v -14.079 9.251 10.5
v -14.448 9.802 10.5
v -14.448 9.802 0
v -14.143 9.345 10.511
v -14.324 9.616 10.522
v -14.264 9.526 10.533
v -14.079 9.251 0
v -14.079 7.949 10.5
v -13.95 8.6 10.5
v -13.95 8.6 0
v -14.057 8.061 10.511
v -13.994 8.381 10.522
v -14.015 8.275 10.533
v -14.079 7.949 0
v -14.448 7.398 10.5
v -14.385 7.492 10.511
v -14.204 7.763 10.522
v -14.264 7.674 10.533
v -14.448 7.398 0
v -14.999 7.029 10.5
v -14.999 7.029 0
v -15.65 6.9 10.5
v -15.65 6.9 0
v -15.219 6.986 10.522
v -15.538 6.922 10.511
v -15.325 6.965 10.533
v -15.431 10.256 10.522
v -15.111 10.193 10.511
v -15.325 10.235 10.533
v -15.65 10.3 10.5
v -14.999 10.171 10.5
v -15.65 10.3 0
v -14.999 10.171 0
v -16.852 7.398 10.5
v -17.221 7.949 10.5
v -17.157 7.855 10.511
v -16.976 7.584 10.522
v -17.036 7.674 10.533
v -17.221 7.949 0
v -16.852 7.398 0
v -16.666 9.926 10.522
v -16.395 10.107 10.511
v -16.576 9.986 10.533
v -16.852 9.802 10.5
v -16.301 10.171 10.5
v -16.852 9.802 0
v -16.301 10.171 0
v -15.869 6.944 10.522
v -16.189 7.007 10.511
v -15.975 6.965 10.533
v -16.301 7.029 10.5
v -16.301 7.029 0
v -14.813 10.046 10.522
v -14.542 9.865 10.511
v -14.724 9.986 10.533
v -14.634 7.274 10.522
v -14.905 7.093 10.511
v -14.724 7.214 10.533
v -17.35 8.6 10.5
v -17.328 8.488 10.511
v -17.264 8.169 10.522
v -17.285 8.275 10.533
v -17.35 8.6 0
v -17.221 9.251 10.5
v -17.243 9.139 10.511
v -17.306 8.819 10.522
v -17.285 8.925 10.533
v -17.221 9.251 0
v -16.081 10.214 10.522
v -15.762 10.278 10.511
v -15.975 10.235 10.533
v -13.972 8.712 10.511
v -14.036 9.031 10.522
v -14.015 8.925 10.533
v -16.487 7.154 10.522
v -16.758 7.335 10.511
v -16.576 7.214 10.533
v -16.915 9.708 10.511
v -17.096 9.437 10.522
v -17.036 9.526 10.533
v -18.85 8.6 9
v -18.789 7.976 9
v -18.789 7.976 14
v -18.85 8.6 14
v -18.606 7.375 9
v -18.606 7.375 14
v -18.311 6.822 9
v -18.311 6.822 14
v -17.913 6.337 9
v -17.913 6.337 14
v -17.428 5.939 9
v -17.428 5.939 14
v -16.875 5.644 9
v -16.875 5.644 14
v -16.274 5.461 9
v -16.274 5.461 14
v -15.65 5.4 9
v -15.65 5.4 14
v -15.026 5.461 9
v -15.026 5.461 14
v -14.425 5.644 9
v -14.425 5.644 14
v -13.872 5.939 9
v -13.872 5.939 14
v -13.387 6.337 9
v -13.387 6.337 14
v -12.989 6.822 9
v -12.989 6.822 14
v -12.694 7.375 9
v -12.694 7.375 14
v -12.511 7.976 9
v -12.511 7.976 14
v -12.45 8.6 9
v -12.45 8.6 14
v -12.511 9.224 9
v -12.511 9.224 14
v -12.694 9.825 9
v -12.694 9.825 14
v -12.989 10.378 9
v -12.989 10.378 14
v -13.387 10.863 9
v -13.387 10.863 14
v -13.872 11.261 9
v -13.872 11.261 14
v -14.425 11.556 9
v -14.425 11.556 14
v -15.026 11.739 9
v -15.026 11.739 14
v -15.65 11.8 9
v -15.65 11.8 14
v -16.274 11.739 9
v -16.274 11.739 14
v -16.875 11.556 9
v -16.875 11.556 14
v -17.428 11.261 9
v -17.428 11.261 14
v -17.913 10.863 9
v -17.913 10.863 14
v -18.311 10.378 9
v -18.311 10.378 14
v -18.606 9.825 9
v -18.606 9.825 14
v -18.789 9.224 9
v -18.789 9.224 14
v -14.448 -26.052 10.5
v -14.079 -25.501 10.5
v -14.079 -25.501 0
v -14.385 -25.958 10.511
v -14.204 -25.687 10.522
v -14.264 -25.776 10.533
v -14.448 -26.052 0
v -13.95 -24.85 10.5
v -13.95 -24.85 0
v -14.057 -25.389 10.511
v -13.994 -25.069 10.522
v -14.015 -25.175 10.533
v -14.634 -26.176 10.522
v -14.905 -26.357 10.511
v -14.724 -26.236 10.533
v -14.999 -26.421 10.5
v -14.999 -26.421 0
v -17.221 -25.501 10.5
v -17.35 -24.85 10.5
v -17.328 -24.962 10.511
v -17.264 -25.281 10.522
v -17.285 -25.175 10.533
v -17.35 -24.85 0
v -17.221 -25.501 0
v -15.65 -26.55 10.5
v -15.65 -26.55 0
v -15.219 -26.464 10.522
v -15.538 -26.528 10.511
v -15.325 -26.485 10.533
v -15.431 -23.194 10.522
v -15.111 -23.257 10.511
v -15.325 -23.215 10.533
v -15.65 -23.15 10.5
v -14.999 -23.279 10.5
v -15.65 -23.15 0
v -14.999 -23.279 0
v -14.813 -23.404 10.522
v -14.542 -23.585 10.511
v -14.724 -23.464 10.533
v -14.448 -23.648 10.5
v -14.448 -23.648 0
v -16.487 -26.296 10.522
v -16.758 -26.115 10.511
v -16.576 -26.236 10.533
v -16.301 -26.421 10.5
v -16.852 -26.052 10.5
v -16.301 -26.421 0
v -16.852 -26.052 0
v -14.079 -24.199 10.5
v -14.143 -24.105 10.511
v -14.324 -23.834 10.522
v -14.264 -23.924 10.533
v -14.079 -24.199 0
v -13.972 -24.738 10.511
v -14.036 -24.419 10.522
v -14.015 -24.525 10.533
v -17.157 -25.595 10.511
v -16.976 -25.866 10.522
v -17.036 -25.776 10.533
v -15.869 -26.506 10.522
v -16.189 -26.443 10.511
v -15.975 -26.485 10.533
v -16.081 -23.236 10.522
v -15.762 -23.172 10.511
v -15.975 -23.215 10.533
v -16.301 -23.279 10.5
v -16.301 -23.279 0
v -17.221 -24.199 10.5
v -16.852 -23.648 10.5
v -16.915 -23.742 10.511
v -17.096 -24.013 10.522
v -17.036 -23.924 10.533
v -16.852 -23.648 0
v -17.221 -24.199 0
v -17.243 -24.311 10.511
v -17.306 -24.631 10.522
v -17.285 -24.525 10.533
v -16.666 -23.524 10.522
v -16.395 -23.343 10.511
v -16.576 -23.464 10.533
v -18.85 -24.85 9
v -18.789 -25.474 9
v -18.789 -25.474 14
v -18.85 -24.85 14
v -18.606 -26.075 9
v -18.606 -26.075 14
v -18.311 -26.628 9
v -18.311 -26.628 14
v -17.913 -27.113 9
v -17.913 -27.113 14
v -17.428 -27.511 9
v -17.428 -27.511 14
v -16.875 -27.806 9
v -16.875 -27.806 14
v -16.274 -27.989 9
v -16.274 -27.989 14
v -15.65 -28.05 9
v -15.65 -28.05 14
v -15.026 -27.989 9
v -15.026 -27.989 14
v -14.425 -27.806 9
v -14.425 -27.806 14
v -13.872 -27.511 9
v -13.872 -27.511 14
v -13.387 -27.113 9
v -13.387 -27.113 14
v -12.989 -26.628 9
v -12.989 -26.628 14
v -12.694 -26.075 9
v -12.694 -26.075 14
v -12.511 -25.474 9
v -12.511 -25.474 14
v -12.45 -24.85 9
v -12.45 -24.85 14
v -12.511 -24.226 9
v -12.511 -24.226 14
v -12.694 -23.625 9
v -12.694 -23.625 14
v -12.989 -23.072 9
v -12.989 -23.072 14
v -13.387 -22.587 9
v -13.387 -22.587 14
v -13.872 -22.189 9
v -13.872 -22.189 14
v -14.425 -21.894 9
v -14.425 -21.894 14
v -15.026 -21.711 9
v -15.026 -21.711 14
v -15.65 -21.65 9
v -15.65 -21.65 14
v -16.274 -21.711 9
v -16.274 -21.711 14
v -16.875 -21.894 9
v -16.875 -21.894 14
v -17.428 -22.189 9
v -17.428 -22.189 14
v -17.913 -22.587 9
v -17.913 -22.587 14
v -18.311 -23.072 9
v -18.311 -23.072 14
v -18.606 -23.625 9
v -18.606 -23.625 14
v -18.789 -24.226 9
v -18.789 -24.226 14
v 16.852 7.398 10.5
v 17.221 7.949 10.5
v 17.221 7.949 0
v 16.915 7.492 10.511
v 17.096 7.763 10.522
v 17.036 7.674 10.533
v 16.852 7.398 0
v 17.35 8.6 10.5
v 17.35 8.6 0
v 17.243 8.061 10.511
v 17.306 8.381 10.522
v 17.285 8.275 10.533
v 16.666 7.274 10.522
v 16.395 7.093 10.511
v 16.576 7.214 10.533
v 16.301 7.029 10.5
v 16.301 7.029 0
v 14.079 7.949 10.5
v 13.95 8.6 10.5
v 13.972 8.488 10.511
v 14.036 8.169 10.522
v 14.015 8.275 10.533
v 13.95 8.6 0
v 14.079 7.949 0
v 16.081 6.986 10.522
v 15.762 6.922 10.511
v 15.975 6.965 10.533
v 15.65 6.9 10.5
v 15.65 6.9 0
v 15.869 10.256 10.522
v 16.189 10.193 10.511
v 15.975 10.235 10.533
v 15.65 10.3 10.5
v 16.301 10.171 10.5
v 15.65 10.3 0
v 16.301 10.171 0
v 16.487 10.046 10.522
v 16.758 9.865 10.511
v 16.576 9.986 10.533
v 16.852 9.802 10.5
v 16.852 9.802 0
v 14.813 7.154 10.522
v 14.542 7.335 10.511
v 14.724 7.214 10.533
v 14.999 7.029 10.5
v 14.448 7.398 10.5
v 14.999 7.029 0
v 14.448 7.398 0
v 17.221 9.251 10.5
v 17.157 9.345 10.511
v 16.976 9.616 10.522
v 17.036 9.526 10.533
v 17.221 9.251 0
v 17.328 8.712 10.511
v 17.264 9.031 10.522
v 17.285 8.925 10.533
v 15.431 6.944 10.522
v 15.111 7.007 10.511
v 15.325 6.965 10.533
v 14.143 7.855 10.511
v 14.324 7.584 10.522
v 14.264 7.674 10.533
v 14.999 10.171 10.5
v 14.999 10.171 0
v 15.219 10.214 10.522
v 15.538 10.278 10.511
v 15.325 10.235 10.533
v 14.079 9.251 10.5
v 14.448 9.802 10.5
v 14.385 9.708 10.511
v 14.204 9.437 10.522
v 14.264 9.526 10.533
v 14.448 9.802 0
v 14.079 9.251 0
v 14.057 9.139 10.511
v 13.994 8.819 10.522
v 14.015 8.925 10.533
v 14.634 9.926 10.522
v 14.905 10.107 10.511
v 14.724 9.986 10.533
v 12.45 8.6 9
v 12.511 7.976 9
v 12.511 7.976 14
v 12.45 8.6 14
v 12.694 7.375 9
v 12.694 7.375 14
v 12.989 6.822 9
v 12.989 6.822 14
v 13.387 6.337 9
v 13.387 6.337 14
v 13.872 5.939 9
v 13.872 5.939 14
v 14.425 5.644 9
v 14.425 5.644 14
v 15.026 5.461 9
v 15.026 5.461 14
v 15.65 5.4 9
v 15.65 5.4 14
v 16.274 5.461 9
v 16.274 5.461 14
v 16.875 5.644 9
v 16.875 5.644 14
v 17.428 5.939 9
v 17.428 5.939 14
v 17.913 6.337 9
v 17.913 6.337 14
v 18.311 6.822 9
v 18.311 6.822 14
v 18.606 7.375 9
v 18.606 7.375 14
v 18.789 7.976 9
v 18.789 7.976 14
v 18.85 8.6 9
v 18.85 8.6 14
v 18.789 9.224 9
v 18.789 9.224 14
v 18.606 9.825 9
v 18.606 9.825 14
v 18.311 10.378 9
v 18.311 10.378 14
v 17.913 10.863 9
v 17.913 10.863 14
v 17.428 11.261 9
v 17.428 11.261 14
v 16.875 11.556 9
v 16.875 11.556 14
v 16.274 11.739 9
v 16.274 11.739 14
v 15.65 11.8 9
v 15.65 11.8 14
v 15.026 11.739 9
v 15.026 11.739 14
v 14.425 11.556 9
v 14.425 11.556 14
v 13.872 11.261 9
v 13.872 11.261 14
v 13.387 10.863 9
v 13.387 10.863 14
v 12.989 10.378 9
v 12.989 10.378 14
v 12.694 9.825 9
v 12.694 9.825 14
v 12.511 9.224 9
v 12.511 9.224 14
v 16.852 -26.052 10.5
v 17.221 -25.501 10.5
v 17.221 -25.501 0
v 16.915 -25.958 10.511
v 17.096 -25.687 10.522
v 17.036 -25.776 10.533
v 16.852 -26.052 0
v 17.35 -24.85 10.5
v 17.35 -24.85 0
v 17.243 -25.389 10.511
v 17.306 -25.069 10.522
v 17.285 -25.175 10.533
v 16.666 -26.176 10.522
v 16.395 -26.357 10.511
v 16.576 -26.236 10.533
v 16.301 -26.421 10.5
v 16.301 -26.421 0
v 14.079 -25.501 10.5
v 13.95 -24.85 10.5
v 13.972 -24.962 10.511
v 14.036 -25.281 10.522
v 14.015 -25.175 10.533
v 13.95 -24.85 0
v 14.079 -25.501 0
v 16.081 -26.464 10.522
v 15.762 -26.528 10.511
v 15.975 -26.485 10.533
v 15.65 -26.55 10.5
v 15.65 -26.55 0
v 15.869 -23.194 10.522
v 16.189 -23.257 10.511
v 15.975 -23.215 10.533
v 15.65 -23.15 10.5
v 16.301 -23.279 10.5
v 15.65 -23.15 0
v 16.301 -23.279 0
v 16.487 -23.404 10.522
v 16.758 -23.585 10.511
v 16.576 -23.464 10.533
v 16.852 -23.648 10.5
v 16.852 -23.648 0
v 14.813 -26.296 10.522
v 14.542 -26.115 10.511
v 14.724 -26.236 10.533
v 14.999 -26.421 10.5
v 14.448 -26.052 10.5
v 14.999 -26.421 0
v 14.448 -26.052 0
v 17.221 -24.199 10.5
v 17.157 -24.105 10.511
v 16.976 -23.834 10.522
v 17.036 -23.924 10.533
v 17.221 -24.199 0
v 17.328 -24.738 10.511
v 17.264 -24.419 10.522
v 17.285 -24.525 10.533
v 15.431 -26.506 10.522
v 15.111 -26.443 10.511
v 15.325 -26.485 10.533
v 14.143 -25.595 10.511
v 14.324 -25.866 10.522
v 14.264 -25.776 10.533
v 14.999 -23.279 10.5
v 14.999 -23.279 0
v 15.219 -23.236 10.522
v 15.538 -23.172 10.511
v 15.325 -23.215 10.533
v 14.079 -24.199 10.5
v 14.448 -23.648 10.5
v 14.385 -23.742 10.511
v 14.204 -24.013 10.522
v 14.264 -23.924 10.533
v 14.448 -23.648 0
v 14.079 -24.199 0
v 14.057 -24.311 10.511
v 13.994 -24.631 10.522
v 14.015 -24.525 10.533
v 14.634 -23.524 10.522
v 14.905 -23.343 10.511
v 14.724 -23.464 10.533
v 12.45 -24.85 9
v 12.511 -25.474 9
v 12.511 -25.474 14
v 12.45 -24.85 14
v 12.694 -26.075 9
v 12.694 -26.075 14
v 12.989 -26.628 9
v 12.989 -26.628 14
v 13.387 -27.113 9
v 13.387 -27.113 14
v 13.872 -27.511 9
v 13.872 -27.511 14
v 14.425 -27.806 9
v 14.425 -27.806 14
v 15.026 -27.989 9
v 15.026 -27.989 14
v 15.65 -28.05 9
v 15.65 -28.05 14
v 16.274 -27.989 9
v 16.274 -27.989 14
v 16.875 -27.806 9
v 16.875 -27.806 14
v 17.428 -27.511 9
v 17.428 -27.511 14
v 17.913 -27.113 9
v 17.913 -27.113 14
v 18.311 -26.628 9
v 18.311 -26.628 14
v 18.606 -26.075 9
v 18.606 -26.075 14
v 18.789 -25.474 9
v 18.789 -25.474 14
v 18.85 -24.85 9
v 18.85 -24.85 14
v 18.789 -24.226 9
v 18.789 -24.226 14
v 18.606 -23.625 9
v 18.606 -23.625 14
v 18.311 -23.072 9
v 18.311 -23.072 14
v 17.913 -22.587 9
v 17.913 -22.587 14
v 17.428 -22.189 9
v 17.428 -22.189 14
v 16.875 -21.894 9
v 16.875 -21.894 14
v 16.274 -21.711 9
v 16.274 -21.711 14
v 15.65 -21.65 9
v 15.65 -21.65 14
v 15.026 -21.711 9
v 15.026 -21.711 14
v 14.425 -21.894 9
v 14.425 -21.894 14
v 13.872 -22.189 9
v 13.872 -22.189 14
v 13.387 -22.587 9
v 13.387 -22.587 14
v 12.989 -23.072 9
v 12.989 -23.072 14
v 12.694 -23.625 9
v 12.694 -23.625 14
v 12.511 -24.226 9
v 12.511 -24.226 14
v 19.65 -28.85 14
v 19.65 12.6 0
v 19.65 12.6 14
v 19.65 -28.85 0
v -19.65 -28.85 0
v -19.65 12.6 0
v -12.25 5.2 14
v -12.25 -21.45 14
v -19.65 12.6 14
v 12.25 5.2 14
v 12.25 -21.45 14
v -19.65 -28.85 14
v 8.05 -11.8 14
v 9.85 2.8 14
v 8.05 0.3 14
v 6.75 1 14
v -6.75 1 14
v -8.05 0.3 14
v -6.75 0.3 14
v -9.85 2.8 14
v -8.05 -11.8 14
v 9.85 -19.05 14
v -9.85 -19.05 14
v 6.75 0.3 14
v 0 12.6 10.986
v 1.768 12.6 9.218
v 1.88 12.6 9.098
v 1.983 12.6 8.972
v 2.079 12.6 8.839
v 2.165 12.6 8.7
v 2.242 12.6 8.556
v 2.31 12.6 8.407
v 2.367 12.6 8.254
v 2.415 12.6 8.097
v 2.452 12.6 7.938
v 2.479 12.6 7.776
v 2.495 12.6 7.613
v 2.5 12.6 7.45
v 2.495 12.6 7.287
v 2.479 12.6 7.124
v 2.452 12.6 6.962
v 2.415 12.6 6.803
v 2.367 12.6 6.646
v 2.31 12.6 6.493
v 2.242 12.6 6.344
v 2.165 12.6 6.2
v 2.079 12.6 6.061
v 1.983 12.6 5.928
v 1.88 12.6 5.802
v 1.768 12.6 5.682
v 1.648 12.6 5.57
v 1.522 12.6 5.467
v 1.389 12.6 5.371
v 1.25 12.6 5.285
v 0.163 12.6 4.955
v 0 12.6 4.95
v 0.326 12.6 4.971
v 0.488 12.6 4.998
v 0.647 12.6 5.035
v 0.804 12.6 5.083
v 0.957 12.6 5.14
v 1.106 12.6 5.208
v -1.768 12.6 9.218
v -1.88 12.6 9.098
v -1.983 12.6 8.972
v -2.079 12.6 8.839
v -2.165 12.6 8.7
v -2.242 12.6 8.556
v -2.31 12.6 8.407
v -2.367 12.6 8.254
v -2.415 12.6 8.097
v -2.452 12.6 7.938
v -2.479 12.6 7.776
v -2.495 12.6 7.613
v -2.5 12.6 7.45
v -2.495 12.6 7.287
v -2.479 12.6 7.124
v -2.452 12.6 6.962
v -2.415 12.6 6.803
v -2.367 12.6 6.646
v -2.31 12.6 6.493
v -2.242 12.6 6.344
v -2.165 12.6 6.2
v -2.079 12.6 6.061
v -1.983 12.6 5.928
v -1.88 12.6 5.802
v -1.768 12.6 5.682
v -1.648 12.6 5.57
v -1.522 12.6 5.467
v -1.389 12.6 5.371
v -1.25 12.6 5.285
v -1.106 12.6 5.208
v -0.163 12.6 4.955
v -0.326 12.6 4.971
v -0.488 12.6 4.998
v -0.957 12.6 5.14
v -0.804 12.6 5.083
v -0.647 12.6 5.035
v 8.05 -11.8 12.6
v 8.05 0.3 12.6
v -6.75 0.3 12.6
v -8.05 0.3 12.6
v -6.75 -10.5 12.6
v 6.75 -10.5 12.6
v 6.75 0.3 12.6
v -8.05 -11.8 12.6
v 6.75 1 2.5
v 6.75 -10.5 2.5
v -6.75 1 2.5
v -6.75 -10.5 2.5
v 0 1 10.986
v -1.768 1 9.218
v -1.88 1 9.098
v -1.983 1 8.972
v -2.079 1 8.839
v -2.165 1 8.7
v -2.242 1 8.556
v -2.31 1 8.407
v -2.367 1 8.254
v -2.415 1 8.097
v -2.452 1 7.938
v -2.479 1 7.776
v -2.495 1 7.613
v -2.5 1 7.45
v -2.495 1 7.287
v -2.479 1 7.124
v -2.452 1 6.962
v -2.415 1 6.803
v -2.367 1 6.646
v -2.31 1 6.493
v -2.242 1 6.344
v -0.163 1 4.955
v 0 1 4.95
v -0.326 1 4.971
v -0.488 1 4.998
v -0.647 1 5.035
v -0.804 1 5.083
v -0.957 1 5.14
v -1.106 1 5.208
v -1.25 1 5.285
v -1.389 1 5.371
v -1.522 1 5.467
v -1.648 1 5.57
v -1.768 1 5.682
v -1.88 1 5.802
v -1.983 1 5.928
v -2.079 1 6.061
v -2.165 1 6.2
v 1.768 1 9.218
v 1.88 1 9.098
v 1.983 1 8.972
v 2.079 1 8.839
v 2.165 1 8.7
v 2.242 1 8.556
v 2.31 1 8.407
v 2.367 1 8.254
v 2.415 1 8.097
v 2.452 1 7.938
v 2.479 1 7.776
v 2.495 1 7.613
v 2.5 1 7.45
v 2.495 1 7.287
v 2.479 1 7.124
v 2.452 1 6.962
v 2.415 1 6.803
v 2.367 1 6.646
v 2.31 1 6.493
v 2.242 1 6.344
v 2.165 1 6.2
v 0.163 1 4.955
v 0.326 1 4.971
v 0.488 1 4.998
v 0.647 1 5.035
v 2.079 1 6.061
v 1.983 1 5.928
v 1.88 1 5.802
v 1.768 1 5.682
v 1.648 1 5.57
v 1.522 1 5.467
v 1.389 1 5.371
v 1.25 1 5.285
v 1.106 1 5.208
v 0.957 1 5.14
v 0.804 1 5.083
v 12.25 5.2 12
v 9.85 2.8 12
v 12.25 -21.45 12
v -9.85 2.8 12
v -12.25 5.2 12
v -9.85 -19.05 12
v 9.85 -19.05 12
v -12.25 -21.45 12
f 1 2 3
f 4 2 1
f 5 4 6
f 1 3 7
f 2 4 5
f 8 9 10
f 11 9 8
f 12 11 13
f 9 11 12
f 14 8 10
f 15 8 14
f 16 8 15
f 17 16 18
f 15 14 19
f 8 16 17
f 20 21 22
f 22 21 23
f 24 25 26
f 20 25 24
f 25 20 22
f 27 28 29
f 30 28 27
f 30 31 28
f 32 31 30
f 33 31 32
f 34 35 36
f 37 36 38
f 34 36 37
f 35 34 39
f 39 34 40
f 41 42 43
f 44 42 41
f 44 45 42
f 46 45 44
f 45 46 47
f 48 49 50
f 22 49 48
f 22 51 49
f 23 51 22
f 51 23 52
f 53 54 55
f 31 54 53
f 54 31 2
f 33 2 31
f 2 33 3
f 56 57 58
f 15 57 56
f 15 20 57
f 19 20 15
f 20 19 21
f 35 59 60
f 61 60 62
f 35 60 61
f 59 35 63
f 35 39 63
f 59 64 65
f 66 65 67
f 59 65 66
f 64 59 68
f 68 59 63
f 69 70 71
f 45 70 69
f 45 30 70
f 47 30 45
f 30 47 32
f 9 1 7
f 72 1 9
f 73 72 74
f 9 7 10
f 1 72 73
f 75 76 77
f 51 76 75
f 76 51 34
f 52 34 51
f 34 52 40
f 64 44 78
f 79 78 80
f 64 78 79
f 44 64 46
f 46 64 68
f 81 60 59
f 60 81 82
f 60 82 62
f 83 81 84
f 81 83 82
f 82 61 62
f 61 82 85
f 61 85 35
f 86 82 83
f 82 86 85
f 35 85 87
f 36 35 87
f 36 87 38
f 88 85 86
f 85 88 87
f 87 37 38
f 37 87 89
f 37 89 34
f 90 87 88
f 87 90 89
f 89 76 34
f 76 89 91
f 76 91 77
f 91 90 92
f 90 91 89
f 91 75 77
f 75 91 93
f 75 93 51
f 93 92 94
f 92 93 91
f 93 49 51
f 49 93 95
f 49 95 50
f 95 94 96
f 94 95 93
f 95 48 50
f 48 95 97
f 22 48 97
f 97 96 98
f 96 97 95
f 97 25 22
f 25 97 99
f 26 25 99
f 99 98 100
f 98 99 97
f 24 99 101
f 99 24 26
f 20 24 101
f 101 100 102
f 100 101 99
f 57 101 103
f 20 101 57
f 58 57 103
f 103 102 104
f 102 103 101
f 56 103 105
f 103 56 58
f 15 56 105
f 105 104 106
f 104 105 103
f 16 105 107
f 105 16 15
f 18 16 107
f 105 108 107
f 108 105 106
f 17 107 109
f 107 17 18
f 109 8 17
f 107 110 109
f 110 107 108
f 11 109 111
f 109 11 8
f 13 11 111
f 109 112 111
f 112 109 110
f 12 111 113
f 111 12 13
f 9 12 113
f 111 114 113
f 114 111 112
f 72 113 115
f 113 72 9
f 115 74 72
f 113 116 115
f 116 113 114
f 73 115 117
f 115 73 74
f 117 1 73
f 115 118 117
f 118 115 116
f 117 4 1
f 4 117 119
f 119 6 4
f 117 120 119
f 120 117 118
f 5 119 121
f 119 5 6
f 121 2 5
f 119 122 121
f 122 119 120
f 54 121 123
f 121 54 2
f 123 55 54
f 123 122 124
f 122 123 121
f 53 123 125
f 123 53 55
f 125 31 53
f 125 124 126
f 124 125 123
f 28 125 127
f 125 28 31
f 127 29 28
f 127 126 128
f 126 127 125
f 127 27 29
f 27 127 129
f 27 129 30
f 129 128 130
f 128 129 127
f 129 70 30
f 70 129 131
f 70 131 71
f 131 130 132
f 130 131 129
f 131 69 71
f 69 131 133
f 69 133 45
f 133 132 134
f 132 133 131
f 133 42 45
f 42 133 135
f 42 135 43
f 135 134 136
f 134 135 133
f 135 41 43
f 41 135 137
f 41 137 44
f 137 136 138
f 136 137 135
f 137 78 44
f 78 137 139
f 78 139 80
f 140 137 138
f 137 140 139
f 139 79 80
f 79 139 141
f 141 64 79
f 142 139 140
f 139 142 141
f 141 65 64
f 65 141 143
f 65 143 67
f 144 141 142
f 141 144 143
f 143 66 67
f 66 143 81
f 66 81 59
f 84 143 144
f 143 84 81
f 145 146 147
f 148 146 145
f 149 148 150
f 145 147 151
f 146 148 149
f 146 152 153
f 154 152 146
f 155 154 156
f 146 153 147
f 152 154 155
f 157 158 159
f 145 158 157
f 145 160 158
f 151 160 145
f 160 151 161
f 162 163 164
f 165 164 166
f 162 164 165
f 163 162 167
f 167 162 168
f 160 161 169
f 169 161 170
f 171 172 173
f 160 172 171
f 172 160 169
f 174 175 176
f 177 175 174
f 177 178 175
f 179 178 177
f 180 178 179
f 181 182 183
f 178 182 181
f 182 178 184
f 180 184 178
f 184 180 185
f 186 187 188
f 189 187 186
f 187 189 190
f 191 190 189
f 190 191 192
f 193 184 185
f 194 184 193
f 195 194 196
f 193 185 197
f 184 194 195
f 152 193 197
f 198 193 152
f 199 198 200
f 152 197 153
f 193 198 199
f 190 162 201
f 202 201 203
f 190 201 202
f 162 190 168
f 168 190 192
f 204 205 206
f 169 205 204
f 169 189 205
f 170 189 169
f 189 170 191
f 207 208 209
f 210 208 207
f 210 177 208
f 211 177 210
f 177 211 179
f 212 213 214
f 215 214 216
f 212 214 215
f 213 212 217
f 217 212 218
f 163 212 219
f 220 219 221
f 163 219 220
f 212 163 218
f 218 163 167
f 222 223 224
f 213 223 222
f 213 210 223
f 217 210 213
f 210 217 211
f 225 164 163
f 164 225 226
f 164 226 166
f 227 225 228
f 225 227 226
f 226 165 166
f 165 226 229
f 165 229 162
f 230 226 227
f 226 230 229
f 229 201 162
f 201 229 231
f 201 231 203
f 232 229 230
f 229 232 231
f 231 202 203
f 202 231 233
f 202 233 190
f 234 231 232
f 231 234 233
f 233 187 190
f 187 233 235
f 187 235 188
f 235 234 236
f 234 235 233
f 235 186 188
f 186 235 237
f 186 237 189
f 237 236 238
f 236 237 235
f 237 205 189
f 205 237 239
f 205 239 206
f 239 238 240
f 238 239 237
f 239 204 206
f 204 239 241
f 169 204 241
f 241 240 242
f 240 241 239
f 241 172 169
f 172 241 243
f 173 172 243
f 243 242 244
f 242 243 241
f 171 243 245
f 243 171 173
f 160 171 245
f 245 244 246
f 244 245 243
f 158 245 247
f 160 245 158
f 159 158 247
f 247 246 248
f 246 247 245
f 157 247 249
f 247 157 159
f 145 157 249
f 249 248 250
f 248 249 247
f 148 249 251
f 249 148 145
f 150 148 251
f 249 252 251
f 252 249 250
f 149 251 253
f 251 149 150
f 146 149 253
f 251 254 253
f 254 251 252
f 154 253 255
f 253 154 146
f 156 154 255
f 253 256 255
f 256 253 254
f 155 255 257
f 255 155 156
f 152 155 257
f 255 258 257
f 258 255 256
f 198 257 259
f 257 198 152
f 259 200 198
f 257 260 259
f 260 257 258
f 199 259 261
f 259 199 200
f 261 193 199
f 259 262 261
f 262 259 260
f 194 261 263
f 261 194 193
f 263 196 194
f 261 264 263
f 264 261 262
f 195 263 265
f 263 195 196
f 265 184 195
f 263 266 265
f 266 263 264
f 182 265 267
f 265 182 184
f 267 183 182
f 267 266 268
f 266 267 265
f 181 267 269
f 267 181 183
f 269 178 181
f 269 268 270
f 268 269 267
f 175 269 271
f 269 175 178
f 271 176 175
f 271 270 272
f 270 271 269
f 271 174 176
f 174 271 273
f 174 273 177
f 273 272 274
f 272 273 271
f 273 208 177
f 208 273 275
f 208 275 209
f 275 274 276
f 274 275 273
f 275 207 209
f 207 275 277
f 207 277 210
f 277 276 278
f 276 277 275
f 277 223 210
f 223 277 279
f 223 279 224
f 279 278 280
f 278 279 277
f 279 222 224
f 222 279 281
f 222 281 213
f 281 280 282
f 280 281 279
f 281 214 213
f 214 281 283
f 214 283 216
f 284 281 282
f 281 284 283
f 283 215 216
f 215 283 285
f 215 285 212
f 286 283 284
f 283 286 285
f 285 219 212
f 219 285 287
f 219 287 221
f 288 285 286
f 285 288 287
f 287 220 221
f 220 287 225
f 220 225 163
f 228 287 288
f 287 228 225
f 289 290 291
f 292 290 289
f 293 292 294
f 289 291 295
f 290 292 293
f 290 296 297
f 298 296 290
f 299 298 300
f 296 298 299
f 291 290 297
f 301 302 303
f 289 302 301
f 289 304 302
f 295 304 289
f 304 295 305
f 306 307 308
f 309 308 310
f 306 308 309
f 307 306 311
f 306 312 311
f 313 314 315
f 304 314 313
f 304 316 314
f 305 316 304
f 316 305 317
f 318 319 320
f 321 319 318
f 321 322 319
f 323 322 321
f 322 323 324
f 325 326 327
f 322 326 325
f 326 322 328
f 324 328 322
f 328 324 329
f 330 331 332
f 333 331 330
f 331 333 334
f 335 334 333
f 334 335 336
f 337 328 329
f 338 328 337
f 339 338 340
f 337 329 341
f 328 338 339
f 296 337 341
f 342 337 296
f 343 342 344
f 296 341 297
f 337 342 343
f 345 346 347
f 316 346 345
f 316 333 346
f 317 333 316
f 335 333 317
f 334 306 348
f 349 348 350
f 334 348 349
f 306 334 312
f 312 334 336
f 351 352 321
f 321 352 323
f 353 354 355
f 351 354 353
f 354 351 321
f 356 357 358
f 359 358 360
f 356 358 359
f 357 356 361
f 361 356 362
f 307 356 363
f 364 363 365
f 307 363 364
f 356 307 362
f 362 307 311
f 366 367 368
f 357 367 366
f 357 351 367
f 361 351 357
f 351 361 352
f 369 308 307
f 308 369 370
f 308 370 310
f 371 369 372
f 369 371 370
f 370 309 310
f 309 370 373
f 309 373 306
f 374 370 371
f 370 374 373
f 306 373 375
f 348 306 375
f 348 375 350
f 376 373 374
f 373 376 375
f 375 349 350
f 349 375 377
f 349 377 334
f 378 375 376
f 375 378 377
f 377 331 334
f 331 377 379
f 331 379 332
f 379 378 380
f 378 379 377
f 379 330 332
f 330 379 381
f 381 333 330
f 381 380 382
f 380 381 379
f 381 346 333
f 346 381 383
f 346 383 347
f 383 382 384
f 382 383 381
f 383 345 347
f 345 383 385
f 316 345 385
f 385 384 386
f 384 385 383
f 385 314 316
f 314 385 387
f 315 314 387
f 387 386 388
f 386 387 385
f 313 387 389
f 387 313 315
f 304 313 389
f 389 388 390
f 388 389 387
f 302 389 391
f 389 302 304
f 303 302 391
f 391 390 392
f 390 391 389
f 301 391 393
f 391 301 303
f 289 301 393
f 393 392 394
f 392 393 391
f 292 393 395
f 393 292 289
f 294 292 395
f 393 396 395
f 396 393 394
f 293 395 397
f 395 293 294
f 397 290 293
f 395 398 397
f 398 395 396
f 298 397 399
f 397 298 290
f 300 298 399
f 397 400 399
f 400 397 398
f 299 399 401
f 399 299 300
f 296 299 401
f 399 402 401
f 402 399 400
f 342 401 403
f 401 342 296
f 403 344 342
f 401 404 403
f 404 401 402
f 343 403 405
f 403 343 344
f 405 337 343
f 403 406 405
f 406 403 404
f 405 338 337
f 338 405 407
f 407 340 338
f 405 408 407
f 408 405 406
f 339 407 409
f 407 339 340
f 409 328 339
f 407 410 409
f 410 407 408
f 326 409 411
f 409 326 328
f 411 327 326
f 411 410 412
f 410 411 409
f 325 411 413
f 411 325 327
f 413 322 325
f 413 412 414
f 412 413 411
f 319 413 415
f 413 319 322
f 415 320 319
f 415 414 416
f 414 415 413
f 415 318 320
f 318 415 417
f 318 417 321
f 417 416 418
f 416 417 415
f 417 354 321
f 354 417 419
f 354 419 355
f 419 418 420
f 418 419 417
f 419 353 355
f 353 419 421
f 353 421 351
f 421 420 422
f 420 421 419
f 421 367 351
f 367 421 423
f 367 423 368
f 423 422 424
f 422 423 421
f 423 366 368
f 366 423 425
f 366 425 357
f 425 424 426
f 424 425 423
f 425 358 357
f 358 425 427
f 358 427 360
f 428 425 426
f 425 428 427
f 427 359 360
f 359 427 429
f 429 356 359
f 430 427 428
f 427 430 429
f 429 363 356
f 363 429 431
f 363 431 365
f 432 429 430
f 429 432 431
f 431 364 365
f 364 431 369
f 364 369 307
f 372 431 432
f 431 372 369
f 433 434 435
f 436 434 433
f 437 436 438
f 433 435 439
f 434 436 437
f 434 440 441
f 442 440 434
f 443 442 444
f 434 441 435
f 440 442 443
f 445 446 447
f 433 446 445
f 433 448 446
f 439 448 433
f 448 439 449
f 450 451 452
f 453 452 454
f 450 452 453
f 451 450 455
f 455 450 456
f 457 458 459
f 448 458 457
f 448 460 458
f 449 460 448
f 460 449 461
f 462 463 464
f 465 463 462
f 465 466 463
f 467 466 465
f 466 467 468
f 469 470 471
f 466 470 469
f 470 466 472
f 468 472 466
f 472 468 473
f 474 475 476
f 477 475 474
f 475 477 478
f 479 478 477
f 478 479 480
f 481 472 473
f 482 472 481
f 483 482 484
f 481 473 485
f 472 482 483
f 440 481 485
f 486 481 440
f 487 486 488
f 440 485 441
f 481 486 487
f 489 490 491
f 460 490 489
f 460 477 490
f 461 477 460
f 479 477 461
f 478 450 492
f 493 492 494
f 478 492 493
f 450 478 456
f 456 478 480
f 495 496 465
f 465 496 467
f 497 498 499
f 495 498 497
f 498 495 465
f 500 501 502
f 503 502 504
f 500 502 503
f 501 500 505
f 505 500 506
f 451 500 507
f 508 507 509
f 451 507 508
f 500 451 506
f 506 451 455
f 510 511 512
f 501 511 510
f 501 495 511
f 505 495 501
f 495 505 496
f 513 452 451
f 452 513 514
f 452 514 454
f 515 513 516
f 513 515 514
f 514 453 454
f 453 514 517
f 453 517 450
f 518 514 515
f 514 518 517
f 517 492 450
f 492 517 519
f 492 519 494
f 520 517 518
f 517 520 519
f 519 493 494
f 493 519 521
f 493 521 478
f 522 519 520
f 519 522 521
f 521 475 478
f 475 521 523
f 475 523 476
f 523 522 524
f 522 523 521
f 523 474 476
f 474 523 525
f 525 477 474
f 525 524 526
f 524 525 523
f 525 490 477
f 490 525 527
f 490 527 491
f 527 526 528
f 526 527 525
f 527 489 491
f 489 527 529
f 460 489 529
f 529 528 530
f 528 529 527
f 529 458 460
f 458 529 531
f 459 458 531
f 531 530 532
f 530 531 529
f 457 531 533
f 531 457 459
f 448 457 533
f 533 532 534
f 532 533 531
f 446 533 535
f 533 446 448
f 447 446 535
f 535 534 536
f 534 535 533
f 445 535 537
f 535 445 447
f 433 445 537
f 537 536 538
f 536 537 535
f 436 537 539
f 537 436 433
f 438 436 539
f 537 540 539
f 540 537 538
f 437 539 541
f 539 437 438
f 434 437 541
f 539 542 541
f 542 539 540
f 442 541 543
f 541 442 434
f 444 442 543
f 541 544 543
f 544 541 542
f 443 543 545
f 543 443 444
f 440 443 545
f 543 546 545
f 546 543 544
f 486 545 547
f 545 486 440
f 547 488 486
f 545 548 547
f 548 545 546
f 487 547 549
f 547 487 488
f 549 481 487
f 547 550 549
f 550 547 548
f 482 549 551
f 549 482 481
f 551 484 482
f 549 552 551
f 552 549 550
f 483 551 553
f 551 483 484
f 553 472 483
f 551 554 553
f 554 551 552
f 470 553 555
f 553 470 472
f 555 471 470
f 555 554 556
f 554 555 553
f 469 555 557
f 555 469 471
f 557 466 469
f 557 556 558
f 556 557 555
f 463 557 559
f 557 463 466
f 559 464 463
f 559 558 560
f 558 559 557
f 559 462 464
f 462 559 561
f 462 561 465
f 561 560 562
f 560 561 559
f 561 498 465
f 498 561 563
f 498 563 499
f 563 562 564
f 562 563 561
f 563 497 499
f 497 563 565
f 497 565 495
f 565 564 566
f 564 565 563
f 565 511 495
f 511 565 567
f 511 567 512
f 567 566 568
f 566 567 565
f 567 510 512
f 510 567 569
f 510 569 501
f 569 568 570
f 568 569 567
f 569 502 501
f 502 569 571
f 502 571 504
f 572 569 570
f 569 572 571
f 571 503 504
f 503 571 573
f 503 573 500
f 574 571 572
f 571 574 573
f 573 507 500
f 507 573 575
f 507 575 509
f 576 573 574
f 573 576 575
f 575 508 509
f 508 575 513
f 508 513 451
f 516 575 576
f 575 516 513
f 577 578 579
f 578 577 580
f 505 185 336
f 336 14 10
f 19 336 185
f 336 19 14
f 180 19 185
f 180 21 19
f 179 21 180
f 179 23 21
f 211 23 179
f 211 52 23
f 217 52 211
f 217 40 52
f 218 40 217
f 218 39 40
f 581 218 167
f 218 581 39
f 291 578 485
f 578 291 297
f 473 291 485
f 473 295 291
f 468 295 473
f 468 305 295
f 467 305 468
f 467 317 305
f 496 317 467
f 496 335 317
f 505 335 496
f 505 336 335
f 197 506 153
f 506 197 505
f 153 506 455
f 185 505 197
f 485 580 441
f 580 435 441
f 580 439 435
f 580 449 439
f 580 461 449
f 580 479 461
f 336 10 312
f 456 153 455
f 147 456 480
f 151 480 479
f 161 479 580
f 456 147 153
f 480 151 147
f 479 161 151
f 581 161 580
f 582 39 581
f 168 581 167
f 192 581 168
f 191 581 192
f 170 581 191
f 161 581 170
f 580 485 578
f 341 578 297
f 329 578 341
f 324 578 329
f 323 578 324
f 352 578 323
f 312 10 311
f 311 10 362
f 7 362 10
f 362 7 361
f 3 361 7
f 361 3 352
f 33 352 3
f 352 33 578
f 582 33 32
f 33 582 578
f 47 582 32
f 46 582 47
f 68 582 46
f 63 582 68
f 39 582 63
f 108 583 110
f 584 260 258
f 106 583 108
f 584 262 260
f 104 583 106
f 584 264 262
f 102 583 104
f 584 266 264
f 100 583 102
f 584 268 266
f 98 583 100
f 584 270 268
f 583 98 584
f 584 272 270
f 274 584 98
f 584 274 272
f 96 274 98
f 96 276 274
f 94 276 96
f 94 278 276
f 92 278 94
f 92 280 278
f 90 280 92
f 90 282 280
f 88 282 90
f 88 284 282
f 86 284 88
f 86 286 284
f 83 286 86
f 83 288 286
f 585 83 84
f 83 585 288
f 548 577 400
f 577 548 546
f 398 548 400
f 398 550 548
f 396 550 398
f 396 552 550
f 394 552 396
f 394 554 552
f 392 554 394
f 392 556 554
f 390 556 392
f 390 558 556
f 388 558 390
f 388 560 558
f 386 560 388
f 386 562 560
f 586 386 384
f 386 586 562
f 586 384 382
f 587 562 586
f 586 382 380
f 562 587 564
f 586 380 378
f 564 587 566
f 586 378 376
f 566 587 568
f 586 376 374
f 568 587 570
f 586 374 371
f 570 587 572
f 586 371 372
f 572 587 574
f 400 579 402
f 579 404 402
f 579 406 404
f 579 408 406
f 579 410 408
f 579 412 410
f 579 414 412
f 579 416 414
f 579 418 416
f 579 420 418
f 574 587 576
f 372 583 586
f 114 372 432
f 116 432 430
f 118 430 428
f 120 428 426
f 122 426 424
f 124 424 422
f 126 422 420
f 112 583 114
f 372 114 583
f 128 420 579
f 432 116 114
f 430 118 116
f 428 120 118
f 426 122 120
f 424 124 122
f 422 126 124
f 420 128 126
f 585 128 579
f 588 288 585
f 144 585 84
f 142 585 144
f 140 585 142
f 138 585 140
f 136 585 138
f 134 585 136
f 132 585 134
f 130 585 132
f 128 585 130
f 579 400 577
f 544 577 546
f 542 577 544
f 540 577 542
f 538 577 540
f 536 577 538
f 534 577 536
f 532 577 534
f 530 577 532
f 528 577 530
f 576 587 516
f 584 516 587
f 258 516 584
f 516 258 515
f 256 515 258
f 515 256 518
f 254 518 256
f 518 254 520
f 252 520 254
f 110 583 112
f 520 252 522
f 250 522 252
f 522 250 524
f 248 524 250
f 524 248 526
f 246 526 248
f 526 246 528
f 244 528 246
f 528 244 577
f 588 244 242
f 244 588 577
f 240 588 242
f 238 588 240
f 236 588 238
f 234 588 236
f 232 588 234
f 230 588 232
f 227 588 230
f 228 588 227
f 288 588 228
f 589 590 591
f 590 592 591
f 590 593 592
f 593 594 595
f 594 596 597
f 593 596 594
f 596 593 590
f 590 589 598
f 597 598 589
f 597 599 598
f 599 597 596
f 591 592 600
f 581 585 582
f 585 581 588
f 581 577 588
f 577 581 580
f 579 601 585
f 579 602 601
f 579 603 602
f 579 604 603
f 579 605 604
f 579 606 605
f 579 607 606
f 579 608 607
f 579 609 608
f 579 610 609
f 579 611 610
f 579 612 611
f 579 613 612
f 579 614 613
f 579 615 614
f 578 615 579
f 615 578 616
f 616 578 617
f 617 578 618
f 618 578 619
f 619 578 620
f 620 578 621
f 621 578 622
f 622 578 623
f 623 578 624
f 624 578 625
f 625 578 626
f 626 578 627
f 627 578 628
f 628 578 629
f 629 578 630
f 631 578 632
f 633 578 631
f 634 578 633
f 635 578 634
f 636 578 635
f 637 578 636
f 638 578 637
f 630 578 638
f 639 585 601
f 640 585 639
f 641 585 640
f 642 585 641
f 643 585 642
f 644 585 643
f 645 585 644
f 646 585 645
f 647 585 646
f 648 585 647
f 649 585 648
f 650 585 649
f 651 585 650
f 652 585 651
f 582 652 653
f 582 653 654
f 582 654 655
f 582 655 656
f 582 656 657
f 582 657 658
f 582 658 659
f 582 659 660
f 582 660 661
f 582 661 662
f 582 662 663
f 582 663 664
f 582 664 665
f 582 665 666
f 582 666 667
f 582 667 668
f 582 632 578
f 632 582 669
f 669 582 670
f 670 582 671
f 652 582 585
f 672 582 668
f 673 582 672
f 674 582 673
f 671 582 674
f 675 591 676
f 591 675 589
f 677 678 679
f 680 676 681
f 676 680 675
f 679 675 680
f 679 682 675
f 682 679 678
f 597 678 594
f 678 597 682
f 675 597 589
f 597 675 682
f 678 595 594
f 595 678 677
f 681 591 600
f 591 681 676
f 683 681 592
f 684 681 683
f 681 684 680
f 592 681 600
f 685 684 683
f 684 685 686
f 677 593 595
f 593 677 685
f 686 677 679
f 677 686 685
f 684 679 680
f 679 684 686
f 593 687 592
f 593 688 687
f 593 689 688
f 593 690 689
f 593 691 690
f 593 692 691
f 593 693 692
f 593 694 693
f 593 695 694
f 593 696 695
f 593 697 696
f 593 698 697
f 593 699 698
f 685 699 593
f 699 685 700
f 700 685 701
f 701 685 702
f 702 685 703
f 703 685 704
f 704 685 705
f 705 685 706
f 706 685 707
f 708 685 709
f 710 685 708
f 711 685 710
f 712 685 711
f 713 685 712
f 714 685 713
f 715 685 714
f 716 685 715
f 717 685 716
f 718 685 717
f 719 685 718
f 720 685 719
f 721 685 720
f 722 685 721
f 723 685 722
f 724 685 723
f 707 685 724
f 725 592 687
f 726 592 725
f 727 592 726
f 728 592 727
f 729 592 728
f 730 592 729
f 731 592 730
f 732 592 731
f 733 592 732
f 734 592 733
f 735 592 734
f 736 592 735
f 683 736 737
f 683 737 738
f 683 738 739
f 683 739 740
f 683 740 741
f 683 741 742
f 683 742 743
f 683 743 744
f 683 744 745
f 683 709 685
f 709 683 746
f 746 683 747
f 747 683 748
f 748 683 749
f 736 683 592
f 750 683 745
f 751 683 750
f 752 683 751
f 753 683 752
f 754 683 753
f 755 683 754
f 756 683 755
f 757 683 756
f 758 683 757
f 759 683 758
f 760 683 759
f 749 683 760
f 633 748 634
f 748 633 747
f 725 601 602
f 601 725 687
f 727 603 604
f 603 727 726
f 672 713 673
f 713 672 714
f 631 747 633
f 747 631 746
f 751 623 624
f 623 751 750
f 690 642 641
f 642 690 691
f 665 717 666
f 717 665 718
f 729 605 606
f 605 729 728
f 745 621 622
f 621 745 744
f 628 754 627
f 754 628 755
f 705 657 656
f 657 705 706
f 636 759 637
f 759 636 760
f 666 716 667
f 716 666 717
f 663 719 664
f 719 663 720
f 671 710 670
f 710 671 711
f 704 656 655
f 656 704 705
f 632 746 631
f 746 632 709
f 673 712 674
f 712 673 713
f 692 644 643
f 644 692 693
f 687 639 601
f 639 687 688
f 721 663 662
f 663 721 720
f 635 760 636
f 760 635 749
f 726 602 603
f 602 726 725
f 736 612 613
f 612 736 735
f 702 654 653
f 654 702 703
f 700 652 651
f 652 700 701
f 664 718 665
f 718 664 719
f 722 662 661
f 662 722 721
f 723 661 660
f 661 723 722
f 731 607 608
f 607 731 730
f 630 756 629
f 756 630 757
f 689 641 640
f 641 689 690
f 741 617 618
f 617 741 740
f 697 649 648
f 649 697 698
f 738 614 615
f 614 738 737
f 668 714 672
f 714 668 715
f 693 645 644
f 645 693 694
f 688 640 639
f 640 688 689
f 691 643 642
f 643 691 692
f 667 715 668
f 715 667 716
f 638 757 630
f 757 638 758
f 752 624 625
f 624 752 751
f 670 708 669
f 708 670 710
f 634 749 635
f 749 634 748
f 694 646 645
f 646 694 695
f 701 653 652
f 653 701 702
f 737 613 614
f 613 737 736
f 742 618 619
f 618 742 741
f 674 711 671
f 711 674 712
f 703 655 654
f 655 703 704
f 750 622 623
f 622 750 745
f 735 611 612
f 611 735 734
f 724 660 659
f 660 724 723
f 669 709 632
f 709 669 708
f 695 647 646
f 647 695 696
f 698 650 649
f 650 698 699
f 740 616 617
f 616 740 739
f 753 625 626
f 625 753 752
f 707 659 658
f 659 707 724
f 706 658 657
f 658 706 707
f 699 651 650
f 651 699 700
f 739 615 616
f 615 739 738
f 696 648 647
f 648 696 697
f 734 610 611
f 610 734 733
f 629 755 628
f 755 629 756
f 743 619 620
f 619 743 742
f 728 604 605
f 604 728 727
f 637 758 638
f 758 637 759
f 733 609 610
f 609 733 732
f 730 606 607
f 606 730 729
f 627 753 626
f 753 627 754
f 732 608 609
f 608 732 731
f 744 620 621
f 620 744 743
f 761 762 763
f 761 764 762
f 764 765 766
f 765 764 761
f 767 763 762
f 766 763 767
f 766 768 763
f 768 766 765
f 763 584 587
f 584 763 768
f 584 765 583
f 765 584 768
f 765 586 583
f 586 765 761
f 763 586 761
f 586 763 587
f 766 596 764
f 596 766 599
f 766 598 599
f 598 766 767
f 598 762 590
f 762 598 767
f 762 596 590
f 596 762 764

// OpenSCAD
include <../lib/servo-duct-manifold-lib.scad>;
$fn = 96;
sensor_cap();
